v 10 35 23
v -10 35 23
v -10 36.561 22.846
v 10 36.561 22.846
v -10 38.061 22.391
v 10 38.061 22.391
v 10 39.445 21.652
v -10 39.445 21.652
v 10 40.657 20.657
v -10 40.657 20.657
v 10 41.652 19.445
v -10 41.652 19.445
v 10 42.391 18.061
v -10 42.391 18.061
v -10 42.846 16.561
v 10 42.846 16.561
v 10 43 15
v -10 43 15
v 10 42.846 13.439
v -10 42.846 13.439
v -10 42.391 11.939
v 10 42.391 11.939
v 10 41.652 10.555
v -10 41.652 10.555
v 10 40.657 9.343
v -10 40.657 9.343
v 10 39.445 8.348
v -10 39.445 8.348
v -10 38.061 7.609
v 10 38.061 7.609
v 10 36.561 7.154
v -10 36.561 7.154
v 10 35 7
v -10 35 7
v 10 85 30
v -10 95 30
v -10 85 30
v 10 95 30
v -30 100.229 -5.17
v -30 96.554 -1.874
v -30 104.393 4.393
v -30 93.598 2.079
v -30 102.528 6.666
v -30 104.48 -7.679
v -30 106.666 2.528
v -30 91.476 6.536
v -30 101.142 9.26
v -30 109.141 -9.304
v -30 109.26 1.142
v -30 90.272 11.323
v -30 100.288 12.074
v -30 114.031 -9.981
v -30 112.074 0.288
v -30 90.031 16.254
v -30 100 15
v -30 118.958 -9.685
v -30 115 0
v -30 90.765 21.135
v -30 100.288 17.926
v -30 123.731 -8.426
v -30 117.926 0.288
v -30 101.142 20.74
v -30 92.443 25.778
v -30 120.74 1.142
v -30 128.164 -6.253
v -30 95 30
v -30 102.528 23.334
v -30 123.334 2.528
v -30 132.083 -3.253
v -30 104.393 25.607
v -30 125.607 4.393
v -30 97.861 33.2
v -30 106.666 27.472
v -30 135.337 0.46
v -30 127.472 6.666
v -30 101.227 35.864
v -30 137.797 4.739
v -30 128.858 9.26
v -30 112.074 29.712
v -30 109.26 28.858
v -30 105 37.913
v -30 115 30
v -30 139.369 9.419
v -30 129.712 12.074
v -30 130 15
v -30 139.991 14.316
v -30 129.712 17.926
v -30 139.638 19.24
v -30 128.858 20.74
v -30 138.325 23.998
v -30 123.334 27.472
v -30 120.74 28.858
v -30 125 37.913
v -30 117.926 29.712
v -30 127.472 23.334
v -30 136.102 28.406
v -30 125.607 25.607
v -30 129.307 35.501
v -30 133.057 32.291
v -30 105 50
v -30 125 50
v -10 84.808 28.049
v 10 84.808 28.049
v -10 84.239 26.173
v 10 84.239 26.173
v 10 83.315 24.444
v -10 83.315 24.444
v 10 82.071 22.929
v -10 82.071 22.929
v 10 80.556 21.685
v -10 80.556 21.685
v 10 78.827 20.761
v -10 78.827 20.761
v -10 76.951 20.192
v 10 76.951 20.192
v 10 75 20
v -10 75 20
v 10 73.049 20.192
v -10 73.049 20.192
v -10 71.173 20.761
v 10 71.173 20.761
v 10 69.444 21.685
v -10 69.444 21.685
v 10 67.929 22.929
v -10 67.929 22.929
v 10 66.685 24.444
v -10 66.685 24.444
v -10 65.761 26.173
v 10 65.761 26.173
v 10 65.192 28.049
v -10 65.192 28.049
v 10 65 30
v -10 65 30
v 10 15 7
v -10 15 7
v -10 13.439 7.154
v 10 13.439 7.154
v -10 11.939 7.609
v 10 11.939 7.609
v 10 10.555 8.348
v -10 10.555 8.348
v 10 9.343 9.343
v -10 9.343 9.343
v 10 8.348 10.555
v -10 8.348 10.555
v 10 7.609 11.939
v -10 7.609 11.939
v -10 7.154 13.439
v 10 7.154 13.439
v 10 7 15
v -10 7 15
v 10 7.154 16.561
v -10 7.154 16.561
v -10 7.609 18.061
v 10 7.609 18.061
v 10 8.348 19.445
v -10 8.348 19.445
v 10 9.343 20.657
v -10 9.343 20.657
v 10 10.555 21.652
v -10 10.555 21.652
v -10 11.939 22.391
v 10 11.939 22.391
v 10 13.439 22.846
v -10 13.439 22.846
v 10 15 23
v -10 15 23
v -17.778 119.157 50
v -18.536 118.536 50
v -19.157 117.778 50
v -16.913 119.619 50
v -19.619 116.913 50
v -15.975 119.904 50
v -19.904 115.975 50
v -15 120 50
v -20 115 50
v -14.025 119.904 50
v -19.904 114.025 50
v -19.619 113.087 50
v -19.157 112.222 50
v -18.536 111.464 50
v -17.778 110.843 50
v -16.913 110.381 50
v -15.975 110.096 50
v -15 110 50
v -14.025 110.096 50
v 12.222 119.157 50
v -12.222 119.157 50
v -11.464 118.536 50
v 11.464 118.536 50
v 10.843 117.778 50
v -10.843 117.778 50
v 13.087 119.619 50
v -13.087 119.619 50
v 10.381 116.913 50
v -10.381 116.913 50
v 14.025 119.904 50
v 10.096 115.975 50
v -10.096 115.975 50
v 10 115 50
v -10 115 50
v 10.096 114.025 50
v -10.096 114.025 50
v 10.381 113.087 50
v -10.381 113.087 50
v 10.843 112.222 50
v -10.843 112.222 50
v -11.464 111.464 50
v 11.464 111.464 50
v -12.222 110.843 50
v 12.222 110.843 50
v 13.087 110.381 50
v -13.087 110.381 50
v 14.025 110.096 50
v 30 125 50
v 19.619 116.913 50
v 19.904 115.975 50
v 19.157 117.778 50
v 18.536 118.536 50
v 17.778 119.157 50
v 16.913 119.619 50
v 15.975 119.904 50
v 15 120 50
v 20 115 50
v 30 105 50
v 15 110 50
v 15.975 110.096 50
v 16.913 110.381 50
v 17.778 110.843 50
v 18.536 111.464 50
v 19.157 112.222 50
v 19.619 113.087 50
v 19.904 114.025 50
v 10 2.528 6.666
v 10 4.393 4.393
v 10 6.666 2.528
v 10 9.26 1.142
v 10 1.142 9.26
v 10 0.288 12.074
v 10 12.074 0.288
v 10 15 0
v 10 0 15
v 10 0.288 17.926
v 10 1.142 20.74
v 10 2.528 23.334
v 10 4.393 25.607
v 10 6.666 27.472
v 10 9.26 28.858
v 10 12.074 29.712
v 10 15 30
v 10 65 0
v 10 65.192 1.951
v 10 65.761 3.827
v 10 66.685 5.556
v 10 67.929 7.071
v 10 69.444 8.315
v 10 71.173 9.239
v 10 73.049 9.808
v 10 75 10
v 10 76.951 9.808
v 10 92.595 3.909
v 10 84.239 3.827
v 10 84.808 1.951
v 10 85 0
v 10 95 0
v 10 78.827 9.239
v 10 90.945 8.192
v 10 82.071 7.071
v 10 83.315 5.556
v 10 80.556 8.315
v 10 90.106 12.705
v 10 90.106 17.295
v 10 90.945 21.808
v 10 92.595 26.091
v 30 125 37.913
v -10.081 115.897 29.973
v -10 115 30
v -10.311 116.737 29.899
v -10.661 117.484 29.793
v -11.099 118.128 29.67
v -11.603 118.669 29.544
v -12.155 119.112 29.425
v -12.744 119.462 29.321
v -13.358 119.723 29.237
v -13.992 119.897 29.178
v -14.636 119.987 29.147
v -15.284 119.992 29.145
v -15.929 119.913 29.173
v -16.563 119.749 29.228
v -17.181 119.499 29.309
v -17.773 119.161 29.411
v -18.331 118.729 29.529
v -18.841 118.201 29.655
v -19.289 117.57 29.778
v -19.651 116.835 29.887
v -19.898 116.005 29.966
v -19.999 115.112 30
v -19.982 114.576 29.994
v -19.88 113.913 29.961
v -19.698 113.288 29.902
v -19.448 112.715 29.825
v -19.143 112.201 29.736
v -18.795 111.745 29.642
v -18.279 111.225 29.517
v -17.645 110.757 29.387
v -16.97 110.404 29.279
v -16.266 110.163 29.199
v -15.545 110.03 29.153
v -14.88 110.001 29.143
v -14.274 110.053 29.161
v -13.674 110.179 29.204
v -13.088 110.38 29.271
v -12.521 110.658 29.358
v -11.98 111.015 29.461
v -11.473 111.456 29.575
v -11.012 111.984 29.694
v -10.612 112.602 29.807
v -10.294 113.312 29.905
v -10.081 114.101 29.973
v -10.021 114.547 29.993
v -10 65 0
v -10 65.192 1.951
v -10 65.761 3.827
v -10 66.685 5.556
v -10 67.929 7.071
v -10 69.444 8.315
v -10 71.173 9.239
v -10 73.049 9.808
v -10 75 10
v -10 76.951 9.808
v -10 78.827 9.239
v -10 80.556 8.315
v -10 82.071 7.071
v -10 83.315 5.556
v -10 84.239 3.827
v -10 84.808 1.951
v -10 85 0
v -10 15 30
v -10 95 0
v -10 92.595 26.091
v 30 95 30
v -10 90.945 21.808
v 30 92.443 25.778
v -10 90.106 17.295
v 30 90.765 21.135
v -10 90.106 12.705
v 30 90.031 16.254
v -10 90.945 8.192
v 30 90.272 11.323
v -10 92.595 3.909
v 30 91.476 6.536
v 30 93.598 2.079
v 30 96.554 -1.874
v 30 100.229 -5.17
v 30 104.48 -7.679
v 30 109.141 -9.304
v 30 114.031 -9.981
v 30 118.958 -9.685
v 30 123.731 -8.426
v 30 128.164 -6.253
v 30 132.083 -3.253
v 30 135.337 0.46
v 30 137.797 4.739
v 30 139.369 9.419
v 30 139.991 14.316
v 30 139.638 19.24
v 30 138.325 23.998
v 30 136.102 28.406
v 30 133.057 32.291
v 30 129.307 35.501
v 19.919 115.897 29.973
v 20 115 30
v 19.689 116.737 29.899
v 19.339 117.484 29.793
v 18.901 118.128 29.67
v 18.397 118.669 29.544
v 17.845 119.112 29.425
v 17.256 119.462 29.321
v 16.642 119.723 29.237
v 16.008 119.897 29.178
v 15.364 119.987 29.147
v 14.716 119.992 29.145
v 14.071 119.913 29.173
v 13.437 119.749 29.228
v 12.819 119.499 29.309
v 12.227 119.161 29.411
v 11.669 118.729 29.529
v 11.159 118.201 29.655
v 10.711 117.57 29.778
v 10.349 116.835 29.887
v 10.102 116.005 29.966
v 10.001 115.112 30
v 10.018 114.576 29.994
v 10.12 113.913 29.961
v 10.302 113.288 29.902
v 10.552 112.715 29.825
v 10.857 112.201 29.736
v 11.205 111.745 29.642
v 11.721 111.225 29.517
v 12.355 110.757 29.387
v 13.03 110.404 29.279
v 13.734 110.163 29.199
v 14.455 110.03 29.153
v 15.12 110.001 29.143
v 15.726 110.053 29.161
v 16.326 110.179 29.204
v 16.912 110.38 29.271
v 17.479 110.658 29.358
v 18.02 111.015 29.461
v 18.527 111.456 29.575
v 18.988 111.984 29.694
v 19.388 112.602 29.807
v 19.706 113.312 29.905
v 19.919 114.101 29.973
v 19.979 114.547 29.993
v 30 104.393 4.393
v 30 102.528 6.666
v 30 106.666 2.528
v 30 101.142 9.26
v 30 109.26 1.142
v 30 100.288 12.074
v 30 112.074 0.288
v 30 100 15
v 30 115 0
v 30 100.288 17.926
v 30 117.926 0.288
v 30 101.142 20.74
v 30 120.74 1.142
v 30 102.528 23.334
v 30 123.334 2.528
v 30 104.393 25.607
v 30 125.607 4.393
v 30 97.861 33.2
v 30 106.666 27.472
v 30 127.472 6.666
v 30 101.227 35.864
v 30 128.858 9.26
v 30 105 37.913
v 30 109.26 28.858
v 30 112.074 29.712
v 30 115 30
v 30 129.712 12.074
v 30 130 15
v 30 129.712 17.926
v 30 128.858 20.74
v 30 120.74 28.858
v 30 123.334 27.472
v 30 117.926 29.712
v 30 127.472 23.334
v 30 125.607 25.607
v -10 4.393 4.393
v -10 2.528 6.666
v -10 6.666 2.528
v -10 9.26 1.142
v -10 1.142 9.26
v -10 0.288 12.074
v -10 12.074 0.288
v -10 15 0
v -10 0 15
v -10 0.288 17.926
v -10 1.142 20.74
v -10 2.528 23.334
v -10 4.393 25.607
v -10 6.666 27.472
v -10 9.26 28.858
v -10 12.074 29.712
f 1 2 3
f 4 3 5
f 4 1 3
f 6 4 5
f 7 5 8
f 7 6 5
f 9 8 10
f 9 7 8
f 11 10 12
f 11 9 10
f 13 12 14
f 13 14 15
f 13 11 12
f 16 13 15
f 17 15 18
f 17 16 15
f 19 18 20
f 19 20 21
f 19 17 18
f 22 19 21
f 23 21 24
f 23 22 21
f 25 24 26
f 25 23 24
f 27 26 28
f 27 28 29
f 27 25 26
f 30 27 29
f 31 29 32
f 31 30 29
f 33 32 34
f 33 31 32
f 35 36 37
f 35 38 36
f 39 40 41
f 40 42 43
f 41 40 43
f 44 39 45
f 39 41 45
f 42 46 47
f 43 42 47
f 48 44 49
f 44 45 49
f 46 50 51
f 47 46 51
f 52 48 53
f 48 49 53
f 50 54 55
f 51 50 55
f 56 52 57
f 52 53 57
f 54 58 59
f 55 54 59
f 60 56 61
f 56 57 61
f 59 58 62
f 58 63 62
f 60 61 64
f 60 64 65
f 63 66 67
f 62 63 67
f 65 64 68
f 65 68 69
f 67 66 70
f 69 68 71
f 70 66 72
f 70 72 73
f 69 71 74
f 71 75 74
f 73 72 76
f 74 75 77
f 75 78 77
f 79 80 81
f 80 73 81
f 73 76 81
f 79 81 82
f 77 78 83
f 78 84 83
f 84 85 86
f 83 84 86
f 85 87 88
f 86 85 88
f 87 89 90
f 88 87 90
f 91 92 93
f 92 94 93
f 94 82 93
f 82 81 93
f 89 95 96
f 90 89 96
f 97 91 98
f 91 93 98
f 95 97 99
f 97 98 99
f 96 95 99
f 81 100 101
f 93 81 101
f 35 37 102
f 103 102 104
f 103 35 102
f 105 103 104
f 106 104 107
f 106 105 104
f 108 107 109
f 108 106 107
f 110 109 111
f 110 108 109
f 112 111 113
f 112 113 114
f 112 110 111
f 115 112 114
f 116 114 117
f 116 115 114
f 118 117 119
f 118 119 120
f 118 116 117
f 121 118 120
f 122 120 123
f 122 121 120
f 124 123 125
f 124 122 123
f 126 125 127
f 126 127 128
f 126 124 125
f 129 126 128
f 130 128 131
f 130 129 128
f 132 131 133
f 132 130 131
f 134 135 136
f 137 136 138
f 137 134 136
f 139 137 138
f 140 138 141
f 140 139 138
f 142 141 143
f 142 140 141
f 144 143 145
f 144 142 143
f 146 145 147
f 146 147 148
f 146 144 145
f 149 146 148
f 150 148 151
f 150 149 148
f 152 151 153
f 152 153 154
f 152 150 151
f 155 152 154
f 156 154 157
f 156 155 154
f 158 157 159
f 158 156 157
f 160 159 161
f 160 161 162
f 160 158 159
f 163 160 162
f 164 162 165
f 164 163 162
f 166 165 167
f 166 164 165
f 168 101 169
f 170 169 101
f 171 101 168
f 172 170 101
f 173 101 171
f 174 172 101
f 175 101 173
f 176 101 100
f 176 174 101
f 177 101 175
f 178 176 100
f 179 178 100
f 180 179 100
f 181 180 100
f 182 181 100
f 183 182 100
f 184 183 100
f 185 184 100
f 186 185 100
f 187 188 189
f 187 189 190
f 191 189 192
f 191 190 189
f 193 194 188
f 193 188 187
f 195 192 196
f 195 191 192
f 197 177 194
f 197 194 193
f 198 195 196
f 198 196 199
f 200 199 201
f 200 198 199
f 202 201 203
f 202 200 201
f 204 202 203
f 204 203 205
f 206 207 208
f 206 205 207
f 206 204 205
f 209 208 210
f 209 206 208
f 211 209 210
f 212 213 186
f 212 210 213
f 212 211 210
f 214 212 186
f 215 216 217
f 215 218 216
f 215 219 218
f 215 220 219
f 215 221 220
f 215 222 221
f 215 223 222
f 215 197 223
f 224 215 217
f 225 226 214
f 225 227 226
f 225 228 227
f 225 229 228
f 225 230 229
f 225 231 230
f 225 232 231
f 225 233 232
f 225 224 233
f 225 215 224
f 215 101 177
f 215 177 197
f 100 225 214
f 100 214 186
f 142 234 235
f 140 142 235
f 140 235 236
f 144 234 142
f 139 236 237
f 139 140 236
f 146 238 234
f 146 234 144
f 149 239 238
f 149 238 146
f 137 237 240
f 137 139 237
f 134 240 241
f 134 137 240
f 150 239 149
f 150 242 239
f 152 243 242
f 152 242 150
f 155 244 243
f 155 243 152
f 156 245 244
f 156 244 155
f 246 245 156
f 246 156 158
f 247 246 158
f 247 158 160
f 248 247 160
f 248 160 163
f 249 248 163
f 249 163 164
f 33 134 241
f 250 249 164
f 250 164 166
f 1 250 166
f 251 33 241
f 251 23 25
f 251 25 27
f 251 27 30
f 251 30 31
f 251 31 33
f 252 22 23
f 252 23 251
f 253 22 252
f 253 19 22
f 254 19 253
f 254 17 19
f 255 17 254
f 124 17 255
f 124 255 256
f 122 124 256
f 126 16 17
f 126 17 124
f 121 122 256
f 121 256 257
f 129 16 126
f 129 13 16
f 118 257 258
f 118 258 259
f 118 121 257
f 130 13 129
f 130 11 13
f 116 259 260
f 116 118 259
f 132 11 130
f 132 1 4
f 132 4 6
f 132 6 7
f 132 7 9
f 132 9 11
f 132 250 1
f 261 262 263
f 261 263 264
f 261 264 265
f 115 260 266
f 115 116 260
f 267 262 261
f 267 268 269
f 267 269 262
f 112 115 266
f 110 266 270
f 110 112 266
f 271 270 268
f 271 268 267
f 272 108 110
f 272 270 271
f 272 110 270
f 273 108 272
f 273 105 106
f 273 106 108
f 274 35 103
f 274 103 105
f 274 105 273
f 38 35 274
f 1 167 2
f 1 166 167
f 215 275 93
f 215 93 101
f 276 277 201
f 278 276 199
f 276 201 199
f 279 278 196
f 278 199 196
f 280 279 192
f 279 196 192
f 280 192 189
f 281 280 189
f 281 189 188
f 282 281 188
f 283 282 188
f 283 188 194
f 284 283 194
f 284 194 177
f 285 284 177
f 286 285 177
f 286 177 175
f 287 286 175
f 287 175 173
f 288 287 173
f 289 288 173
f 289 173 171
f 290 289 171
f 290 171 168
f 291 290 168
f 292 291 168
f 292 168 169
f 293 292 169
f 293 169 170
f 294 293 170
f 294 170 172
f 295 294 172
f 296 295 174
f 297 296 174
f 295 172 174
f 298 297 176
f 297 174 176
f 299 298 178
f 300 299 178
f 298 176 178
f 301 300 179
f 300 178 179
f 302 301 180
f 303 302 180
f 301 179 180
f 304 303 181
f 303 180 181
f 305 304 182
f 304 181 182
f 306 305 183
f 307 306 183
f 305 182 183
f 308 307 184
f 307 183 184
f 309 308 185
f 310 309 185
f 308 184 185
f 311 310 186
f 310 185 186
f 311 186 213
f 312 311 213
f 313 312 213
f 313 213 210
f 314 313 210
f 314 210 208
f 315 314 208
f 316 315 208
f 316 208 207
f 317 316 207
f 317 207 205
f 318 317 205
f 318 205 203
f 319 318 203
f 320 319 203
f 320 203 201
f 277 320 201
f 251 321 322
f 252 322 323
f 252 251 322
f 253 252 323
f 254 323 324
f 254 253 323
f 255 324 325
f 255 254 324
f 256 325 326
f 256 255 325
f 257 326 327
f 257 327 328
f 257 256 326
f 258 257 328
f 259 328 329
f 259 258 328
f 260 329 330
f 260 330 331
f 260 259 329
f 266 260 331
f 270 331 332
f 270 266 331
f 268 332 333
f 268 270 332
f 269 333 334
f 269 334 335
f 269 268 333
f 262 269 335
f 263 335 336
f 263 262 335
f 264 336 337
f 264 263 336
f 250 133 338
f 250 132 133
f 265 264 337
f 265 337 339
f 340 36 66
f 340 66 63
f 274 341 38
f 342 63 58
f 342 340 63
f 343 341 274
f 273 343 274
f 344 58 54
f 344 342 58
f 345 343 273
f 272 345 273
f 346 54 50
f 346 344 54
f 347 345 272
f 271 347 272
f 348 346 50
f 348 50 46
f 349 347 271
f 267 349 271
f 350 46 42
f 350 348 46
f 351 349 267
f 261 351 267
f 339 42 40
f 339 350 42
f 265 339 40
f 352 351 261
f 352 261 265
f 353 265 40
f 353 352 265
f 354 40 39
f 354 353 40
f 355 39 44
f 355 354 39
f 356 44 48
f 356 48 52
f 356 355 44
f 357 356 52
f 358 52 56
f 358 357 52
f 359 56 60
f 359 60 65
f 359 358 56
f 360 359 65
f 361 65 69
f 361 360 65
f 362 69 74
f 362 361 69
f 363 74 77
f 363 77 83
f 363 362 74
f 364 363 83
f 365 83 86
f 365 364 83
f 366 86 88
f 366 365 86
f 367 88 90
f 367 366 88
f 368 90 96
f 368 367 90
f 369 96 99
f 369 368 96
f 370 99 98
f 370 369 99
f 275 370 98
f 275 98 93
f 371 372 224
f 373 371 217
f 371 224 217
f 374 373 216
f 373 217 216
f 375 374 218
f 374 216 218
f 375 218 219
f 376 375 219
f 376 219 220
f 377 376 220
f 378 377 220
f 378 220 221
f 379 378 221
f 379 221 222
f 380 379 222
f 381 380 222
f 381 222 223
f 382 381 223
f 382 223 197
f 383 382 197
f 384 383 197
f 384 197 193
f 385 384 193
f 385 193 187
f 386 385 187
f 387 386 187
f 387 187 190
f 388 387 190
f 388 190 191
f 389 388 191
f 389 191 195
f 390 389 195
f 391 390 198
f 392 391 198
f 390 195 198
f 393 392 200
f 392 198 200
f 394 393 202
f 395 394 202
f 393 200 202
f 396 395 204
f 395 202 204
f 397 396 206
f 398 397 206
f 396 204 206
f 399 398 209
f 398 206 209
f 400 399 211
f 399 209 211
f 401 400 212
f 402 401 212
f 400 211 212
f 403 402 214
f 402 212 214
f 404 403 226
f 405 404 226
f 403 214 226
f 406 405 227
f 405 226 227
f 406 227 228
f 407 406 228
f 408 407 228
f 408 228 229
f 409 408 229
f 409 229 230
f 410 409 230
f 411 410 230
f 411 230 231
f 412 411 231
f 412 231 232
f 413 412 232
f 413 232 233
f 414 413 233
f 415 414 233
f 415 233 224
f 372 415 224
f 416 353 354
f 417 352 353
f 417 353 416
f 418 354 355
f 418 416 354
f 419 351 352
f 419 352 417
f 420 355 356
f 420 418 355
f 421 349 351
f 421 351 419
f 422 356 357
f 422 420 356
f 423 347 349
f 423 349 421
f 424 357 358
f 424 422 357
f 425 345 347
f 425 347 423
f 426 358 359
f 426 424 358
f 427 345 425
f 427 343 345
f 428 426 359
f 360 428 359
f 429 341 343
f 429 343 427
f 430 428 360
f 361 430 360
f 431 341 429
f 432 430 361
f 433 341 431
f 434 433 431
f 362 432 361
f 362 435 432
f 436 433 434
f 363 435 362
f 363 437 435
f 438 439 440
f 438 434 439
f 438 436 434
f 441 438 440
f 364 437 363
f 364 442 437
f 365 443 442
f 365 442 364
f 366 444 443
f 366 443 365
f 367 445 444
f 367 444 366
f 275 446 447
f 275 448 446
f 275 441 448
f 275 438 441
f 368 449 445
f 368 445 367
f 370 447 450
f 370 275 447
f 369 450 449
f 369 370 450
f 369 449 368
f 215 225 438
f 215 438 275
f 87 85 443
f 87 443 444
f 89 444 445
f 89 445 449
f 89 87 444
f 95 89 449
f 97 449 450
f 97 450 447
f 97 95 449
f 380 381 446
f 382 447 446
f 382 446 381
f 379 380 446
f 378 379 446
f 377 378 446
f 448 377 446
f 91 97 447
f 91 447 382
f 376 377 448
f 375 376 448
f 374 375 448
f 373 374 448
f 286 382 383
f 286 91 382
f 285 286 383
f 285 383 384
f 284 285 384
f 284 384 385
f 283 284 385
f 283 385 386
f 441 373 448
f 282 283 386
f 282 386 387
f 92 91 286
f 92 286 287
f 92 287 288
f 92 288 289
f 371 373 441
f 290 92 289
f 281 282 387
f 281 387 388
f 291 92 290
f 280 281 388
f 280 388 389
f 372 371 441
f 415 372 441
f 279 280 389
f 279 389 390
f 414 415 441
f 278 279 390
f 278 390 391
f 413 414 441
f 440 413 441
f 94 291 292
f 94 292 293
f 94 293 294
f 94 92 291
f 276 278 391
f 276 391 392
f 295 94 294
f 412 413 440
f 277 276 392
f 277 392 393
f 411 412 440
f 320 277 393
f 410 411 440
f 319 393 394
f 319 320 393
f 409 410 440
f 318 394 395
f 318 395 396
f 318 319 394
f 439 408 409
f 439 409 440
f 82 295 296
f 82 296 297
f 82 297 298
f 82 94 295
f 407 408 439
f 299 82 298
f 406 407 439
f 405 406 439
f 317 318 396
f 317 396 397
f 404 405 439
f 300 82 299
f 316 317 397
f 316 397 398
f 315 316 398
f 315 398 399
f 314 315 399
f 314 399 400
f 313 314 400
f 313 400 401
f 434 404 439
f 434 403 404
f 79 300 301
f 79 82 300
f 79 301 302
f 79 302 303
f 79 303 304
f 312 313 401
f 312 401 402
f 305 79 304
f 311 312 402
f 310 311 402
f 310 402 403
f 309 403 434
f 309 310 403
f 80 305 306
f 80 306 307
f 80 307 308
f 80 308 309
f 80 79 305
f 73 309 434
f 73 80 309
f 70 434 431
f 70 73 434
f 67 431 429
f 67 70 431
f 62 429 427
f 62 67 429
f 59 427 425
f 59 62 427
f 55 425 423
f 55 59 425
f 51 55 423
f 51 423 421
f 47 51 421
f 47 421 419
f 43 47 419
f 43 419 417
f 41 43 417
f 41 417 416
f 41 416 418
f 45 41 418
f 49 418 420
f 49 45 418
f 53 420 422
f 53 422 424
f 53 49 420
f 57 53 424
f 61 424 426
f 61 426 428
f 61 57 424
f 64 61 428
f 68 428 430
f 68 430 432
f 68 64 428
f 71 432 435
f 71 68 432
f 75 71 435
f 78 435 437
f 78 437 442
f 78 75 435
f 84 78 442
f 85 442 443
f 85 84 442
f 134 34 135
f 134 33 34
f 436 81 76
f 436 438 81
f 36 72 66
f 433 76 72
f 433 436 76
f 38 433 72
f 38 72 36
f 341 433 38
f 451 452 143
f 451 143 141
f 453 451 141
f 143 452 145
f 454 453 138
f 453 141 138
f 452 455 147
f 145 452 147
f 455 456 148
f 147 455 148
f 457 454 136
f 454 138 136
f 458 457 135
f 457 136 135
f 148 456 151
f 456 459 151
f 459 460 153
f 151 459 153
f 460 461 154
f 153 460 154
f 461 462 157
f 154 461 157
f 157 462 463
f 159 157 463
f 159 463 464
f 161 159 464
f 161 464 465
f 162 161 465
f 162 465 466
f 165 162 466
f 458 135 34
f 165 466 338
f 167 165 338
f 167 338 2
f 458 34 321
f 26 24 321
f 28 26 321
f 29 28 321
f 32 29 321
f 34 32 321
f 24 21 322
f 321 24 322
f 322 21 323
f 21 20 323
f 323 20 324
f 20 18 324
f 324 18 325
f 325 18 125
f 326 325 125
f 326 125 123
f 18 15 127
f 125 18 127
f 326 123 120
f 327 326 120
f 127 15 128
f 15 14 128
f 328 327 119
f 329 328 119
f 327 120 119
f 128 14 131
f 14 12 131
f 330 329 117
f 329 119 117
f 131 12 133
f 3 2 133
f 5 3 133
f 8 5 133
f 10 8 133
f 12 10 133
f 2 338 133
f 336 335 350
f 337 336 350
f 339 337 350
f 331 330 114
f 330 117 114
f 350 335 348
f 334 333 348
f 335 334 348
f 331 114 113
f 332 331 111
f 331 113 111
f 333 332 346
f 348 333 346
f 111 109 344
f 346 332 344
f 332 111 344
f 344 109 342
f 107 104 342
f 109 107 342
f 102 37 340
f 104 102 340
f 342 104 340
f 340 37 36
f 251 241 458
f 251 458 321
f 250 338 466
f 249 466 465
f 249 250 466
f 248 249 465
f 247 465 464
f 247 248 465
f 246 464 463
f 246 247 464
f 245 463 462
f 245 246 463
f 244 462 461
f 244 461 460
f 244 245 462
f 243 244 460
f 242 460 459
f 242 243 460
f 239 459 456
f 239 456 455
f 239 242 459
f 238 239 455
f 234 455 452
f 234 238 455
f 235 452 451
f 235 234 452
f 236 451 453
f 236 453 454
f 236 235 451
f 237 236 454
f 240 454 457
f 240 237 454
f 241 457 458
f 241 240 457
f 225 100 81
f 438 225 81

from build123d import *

# Parameters (mm, degrees)
F0_R     = 15
F1_DEPTH = 30
F2_DEPTH = 10
F3_R     = 5
F4_DEPTH = 20.8588644763


with BuildPart() as f1:
    # F0 (on Right) → F1 (new body, symmetric)
    with BuildSketch(Plane.YZ):
        with BuildLine():
            ThreePointArc((95, 30), (90, 15), (95, 0))
            ThreePointArc((95, 0), (134.6047593344, -0.5130078141), (125, 37.9128784748))
            Line((125, 37.9128784748), (125, 50))
            Line((125, 50), (105, 50))
            Line((105, 50), (105, 37.9128784748))
            ThreePointArc((105, 37.9128784748), (99.4869921859, 34.6047593344), (95, 30))
        make_face()
        with Locations((115, 15)):
            Circle(F0_R, mode=Mode.SUBTRACT)
    extrude(amount=F1_DEPTH, both=True)

    # F0 (on Right) → F2 (join, symmetric)
    with BuildSketch(Plane.YZ):
        with BuildLine():
            ThreePointArc((15, 30), (0, 15), (15, 0))
            Line((15, 0), (65, 0))
            ThreePointArc((65, 0), (75, 10), (85, 0))
            Line((85, 0), (95, 0))
            ThreePointArc((95, 0), (90, 15), (95, 30))
            Line((95, 30), (85, 30))
            ThreePointArc((85, 30), (75, 20), (65, 30))
            Line((65, 30), (15, 30))
        make_face()
        with BuildLine():
            ThreePointArc((15, 7), (7, 15), (15, 23))
            Line((15, 23), (35, 23))
            ThreePointArc((35, 23), (43, 15), (35, 7))
            Line((35, 7), (15, 7))
        make_face(mode=Mode.SUBTRACT)
    extrude(amount=F2_DEPTH, both=True)

    # F3 (on face) → F4 (cut, through all)
    with BuildSketch(Plane.XY.offset(50)):
        with Locations((15, 115)):
            Circle(F3_R)
        with Locations((-15, 115)):
            Circle(F3_R)
    extrude(amount=-F4_DEPTH, mode=Mode.SUBTRACT)


solid = f1.part
